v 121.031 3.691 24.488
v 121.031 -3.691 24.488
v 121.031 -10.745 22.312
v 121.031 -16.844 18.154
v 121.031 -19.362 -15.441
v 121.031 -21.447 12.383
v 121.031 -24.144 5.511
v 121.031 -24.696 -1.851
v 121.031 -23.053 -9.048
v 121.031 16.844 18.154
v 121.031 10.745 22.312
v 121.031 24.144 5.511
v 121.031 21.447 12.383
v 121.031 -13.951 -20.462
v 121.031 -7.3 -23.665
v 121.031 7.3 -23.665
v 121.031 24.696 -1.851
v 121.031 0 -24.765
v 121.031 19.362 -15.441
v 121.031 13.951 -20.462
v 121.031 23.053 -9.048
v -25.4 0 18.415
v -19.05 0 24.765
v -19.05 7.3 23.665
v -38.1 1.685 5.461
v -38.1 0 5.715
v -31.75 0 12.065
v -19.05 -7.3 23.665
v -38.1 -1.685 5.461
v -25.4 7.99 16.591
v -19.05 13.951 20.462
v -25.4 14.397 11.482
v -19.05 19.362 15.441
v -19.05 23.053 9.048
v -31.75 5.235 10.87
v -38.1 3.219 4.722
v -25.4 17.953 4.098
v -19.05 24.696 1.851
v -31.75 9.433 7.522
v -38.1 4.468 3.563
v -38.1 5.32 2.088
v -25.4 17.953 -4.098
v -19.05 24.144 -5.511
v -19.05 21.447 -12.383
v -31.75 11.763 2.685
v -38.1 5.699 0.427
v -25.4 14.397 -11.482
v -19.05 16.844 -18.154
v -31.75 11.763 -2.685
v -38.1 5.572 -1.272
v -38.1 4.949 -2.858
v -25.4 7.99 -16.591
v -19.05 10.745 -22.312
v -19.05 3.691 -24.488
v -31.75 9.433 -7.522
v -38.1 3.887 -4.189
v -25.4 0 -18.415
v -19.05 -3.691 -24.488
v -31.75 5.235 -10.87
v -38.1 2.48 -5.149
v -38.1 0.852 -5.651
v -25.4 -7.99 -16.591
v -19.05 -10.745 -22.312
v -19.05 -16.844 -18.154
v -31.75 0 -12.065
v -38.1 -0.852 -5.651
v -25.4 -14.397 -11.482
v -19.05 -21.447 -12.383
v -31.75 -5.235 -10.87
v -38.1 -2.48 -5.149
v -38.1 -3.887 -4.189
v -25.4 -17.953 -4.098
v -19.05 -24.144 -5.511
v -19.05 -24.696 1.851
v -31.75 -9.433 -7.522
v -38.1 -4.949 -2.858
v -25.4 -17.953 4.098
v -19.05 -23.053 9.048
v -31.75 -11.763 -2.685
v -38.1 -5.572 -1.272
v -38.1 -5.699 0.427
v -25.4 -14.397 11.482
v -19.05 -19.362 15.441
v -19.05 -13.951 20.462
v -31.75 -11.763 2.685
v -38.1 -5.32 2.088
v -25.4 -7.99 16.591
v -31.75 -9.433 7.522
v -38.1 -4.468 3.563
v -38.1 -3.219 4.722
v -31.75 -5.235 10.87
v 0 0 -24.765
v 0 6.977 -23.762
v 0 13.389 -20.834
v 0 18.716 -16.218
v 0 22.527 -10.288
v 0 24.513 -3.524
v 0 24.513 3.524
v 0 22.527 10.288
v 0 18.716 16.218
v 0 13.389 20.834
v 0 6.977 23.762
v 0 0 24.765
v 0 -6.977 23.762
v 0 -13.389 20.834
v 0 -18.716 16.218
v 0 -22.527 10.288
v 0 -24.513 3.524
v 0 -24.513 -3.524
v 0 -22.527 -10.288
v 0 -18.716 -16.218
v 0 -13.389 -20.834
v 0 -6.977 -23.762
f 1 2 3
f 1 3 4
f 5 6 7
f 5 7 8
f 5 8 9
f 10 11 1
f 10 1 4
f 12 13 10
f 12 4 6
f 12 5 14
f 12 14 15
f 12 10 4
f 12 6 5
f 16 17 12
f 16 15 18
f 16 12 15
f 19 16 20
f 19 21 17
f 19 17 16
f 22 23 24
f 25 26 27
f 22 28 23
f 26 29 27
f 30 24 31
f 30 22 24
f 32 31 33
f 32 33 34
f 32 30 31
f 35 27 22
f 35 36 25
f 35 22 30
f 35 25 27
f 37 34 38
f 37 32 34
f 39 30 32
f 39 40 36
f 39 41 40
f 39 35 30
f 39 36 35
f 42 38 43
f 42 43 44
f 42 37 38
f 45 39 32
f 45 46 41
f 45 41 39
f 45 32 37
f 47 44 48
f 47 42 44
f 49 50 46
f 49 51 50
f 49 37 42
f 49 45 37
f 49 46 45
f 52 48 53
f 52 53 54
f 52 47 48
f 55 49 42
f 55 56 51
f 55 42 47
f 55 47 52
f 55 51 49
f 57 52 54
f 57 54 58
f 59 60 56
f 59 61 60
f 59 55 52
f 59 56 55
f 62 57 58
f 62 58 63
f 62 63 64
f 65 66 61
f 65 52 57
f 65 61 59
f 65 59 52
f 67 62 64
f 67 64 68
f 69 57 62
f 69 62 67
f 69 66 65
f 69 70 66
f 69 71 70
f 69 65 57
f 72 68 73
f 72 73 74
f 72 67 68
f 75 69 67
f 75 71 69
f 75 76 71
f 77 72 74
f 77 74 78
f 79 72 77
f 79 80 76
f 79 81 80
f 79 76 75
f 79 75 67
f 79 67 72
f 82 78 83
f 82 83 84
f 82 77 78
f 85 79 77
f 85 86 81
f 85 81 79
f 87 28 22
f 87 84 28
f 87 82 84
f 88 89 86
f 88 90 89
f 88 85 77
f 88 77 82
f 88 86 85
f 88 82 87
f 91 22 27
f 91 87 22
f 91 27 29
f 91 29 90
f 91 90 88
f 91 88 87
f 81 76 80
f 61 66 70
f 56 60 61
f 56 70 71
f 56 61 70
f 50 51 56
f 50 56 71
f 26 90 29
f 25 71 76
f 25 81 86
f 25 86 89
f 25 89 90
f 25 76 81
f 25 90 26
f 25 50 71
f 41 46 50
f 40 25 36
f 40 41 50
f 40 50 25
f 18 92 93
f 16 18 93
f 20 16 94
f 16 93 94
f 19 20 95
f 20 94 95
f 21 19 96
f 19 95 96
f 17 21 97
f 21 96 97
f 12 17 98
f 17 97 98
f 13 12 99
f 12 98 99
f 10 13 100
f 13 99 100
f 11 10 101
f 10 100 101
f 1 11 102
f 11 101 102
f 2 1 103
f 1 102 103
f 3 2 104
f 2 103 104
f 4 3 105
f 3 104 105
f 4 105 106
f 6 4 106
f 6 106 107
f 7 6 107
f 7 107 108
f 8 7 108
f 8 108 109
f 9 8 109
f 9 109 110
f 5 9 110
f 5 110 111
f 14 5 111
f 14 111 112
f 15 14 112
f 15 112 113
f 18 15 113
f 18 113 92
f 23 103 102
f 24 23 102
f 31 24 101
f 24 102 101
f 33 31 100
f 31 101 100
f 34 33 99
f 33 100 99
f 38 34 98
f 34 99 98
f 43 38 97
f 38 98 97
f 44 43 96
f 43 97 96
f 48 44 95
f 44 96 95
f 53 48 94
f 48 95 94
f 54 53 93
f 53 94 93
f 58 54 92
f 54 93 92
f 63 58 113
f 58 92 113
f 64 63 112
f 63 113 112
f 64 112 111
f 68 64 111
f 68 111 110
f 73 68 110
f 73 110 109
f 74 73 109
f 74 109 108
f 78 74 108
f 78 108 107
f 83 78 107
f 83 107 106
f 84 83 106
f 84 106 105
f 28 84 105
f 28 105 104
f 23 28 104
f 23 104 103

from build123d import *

# Parameters (mm, degrees)
SKETCH1_R           = 24.765
BOSS_EXTRUDE1_DEPTH = 121.031
SKETCH3_R           = 24.765
BOSS_EXTRUDE2_DEPTH = 38.1
CHAMFER1_SIZE       = 19.05


with BuildPart() as part:
    # Sketch1 → Boss-Extrude1 (new body)
    with BuildSketch(Plane(origin=(0, 0, 0), x_dir=(0, 0, -1), z_dir=(1, 0, 0))):
        Circle(SKETCH1_R)
    extrude(amount=BOSS_EXTRUDE1_DEPTH)

    # Sketch3 → Boss-Extrude2 (add)
    with BuildSketch(Plane.ZY):
        Circle(SKETCH3_R)
    extrude(amount=BOSS_EXTRUDE2_DEPTH)

    # Chamfer1
    chamfer1_edges = [part.edges().sort_by_distance(p)[0] for p in [
        (-38.1, 0, -24.765),
    ]]
    chamfer(chamfer1_edges, length=CHAMFER1_SIZE)


solid = part.part
